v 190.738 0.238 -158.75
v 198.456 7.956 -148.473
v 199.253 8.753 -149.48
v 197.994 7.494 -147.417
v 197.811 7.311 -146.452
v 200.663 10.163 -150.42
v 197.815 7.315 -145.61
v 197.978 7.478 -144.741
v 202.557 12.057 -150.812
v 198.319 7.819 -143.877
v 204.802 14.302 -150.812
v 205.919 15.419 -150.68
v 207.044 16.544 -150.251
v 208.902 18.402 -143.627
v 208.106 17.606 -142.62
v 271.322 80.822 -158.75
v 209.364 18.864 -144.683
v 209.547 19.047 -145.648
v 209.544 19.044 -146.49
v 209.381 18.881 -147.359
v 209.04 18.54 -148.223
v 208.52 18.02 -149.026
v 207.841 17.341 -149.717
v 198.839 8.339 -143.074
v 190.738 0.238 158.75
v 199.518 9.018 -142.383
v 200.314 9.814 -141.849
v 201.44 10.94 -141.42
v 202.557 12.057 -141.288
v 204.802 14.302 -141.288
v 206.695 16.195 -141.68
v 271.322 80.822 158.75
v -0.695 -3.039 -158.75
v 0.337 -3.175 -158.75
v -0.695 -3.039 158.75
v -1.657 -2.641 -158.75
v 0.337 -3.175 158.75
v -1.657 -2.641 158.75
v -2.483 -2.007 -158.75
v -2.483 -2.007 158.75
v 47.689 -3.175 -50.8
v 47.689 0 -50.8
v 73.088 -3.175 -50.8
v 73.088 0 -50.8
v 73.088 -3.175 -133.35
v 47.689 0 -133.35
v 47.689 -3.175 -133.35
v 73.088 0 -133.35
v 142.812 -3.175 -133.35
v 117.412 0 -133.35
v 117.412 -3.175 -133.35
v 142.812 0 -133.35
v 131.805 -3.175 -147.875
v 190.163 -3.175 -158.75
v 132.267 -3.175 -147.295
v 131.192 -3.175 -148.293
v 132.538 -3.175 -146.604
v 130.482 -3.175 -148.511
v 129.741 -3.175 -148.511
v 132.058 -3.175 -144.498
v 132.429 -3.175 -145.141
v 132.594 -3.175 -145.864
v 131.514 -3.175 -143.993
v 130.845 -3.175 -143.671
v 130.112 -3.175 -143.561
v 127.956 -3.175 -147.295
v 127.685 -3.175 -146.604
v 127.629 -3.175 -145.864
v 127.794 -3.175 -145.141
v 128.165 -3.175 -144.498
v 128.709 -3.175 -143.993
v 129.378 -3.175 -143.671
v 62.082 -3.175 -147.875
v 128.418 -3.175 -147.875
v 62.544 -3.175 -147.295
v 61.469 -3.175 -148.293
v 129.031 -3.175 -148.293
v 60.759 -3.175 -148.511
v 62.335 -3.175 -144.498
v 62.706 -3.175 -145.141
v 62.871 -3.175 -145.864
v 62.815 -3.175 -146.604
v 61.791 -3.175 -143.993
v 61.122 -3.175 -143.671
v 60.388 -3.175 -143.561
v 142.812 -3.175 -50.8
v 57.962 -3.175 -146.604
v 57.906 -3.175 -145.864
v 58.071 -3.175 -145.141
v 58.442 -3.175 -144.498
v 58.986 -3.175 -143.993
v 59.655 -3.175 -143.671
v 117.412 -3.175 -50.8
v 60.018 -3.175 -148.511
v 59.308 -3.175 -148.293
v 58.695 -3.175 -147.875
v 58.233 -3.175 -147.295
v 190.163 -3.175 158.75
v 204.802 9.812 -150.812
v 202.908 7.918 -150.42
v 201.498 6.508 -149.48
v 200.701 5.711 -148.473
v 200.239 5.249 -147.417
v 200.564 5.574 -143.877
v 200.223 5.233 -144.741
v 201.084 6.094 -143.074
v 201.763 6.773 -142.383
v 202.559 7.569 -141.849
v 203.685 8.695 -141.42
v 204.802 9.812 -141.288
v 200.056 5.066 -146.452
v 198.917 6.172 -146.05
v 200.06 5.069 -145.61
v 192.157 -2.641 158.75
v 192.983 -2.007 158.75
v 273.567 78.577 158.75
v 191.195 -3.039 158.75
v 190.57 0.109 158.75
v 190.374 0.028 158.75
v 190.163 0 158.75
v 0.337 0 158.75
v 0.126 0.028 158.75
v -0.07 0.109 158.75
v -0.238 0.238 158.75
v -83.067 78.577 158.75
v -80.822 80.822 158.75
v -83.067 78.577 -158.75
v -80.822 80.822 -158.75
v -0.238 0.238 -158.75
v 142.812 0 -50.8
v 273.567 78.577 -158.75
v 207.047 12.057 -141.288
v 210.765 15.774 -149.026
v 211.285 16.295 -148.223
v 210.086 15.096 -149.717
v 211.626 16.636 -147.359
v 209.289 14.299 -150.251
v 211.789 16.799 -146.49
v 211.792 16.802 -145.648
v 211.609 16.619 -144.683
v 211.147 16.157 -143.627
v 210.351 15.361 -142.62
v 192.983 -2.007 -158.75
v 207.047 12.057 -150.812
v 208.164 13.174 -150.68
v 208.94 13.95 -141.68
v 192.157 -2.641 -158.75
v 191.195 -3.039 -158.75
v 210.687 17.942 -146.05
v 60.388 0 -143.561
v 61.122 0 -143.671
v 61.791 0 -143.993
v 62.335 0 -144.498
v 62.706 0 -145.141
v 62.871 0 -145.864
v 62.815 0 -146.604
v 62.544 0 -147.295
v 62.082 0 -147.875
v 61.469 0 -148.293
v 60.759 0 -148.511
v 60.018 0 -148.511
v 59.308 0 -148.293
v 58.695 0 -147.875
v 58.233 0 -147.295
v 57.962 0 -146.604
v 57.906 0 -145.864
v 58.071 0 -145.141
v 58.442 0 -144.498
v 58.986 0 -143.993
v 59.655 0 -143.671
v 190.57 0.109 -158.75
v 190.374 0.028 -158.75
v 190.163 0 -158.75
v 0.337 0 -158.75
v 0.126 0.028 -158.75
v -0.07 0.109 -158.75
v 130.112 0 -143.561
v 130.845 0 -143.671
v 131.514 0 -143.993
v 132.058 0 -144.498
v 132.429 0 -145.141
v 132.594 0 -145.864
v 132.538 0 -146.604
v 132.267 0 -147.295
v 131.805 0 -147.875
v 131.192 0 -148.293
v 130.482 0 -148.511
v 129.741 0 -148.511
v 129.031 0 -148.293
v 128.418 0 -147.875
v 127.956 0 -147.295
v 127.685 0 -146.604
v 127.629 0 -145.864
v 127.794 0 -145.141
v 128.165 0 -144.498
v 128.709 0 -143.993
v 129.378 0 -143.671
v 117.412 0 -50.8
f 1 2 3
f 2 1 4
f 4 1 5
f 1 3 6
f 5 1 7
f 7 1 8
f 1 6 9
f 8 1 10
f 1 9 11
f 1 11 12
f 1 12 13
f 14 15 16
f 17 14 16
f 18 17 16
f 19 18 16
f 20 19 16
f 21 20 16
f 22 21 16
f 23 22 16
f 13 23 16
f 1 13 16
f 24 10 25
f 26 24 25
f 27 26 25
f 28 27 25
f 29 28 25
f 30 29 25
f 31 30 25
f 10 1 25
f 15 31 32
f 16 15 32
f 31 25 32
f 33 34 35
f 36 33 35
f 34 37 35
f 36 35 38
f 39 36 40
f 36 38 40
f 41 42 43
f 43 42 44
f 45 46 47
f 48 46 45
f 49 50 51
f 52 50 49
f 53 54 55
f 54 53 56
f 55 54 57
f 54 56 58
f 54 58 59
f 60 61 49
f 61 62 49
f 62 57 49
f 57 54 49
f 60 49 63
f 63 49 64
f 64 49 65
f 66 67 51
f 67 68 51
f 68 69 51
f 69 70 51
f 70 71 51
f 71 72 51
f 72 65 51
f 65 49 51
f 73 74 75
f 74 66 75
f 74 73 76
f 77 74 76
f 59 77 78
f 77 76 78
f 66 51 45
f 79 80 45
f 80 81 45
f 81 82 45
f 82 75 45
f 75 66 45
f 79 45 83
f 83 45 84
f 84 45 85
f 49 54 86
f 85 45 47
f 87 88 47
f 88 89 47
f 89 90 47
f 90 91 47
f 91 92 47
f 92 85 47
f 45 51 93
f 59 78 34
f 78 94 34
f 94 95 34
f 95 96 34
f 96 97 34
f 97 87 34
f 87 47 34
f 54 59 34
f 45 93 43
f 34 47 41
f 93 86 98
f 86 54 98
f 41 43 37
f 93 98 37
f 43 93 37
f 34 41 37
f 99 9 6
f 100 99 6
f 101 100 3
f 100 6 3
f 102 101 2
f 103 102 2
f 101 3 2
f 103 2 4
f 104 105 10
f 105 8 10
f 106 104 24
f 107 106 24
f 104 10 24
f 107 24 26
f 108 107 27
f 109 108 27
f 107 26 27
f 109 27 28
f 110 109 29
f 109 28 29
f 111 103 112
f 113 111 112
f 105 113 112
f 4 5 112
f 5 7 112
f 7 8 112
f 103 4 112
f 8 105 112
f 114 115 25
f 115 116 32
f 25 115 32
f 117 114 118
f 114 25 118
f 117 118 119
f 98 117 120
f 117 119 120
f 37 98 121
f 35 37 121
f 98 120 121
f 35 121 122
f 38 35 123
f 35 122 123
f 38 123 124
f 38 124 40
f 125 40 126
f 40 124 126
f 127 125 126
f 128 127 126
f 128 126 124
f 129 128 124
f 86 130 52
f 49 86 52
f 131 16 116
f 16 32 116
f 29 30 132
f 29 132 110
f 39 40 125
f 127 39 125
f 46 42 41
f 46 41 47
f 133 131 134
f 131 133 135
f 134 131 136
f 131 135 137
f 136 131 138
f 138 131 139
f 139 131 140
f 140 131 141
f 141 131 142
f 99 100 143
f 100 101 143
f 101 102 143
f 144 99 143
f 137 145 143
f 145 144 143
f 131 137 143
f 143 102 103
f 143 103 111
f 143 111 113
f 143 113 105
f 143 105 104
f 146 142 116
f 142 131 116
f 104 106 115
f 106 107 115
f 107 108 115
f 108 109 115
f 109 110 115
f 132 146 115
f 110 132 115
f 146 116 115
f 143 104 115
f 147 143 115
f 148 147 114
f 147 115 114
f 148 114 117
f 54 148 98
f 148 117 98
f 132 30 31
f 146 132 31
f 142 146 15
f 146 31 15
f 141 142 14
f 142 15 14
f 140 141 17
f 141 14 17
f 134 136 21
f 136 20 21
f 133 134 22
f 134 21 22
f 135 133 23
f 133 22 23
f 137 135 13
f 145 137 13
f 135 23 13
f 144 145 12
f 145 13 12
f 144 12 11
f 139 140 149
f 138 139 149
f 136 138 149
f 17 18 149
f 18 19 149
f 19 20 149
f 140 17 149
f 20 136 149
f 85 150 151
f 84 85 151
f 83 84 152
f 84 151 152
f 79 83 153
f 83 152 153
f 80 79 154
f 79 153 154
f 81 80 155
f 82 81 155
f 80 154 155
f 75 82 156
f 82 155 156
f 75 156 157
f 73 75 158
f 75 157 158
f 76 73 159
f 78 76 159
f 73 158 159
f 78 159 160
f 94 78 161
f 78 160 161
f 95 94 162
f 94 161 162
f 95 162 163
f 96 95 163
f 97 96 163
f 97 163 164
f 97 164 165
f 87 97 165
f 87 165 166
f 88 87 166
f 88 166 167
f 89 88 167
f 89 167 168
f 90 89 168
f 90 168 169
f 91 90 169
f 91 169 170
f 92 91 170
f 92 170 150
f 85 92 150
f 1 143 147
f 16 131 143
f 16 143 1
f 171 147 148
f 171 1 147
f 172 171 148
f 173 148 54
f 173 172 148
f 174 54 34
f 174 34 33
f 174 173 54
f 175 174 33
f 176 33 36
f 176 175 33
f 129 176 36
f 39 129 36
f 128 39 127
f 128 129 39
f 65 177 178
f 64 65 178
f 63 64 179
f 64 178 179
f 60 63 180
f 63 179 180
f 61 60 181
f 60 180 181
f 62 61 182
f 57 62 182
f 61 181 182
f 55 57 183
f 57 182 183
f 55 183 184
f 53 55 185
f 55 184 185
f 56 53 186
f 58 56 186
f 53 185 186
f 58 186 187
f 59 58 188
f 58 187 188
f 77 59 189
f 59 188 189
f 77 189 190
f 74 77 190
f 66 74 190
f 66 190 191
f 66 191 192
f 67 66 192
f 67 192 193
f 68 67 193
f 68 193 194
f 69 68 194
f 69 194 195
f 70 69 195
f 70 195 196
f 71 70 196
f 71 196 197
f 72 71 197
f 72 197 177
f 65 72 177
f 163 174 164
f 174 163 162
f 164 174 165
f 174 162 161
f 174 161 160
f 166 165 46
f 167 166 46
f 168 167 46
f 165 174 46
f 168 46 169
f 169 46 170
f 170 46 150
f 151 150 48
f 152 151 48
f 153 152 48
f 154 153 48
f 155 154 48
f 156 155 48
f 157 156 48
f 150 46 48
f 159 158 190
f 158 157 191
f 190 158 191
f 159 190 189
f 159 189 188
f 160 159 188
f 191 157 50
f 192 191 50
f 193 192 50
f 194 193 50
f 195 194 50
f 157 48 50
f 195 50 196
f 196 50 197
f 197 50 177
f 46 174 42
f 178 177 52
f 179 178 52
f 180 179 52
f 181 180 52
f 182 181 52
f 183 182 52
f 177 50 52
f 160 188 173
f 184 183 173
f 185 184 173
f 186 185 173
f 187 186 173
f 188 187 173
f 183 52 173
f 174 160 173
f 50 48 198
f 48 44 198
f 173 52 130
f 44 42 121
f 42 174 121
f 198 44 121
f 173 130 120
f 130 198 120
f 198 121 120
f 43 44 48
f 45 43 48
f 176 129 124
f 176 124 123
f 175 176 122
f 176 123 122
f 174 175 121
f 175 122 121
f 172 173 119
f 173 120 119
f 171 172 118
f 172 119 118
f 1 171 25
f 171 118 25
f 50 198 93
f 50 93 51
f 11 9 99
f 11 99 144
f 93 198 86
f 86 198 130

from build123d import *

# Parameters (mm, degrees)
BASE_FLANGE1_DEPTH = 158.75
SKETCH8_R          = 2.4892
SKETCH8_W          = 25.4
SKETCH8_H          = 82.55
CUT_EXTRUDE1_DEPTH = 327.455070335
CUT_EXTRUDE3_START = 134.703841816
CUT_EXTRUDE3_DEPTH = 3.175


# Read off the part's stored shape, not the designer's step: Cut-Extrude3
# Sheet-metal steps are written as plain solids
with BuildPart() as part:
    # Sketch1 → Base-Flange1 (new, symmetric)
    with BuildSketch(Plane.XY):
        with BuildLine():
            Line((-80.82230509, 80.82230509), (-0.238063608, 0.238063608))
            ThreePointArc((-0.238063608, 0.238063608), (0.02562769, 0.061870716), (0.336672783, 0))
            Line((0.336672783, 0), (190.163327217, 0))
            ThreePointArc((190.163327217, 0), (190.47437231, 0.061870716), (190.738063608, 0.238063608))
            Line((190.738063608, 0.238063608), (271.32230509, 80.82230509))
            Line((271.32230509, 80.82230509), (273.56736912, 78.577241059))
            Line((273.56736912, 78.577241059), (192.983127639, -2.007000422))
            ThreePointArc((192.983127639, -2.007000422), (191.689392208, -2.8714468), (190.163327217, -3.175))
            Line((190.163327217, -3.175), (0.336672783, -3.175))
            ThreePointArc((0.336672783, -3.175), (-1.189392208, -2.8714468), (-2.483127639, -2.007000422))
            Line((-2.483127639, -2.007000422), (-83.06736912, 78.577241059))
            Line((-83.06736912, 78.577241059), (-80.82230509, 80.82230509))
        make_face()
    extrude(amount=BASE_FLANGE1_DEPTH, both=True)

    # Sketch8 → Cut-Extrude1 (cut, through all)
    with BuildSketch(Plane(origin=(0, 0, 0), x_dir=(1, 0, 0), z_dir=(0, 1, 0))):
        with Locations(Location((60.3885, 146.05, 0), (0, 0, 270))):
            Circle(SKETCH8_R)
        with Locations(Location((130.1115, 146.05, 0), (0, 0, 270))):
            Circle(SKETCH8_R)
        with Locations((60.3885, 92.075)):
            Rectangle(SKETCH8_W, SKETCH8_H)
        with Locations((130.1115, 92.075)):
            Rectangle(SKETCH8_W, SKETCH8_H)
    extrude(amount=-CUT_EXTRUDE1_DEPTH, mode=Mode.SUBTRACT)

    # Cut-Extrude3 outline → Cut-Extrude3 (cut)
    with BuildSketch(Plane(origin=(0, 0, 0), x_dir=(0.7071067811865472, 0.7071067811865479, 0), z_dir=(0.7071067811865479, -0.707106781186547, 0)).offset(CUT_EXTRUDE3_START)):
        with BuildLine():
            add(Edge.make_bspline(
                [(151.754493433, -150.8125), (145.019301342, -150.8125), (145.019301342, -146.05), (145.019301342, -141.2875), (151.754493433, -141.2875)],
                knots=[4.71238898, 4.71238898, 4.71238898, 6.283185307, 6.283185307, 7.853981634, 7.853981634, 7.853981634], degree=2, weights=[1, 0.707106781, 1, 0.707106781, 1]))
            Line((151.754493433, -150.8125), (154.929493433, -150.8125))
            add(Edge.make_bspline(
                [(154.929493433, -141.2875), (161.664685524, -141.2875), (161.664685524, -146.05), (161.664685524, -150.8125), (154.929493433, -150.8125)],
                knots=[1.570796327, 1.570796327, 1.570796327, 3.141592654, 3.141592654, 4.71238898, 4.71238898, 4.71238898], degree=2, weights=[1, 0.707106781, 1, 0.707106781, 1]))
            Line((154.929493433, -141.2875), (151.754493433, -141.2875))
        make_face()
    extrude(amount=CUT_EXTRUDE3_DEPTH, mode=Mode.SUBTRACT)


solid = part.part
